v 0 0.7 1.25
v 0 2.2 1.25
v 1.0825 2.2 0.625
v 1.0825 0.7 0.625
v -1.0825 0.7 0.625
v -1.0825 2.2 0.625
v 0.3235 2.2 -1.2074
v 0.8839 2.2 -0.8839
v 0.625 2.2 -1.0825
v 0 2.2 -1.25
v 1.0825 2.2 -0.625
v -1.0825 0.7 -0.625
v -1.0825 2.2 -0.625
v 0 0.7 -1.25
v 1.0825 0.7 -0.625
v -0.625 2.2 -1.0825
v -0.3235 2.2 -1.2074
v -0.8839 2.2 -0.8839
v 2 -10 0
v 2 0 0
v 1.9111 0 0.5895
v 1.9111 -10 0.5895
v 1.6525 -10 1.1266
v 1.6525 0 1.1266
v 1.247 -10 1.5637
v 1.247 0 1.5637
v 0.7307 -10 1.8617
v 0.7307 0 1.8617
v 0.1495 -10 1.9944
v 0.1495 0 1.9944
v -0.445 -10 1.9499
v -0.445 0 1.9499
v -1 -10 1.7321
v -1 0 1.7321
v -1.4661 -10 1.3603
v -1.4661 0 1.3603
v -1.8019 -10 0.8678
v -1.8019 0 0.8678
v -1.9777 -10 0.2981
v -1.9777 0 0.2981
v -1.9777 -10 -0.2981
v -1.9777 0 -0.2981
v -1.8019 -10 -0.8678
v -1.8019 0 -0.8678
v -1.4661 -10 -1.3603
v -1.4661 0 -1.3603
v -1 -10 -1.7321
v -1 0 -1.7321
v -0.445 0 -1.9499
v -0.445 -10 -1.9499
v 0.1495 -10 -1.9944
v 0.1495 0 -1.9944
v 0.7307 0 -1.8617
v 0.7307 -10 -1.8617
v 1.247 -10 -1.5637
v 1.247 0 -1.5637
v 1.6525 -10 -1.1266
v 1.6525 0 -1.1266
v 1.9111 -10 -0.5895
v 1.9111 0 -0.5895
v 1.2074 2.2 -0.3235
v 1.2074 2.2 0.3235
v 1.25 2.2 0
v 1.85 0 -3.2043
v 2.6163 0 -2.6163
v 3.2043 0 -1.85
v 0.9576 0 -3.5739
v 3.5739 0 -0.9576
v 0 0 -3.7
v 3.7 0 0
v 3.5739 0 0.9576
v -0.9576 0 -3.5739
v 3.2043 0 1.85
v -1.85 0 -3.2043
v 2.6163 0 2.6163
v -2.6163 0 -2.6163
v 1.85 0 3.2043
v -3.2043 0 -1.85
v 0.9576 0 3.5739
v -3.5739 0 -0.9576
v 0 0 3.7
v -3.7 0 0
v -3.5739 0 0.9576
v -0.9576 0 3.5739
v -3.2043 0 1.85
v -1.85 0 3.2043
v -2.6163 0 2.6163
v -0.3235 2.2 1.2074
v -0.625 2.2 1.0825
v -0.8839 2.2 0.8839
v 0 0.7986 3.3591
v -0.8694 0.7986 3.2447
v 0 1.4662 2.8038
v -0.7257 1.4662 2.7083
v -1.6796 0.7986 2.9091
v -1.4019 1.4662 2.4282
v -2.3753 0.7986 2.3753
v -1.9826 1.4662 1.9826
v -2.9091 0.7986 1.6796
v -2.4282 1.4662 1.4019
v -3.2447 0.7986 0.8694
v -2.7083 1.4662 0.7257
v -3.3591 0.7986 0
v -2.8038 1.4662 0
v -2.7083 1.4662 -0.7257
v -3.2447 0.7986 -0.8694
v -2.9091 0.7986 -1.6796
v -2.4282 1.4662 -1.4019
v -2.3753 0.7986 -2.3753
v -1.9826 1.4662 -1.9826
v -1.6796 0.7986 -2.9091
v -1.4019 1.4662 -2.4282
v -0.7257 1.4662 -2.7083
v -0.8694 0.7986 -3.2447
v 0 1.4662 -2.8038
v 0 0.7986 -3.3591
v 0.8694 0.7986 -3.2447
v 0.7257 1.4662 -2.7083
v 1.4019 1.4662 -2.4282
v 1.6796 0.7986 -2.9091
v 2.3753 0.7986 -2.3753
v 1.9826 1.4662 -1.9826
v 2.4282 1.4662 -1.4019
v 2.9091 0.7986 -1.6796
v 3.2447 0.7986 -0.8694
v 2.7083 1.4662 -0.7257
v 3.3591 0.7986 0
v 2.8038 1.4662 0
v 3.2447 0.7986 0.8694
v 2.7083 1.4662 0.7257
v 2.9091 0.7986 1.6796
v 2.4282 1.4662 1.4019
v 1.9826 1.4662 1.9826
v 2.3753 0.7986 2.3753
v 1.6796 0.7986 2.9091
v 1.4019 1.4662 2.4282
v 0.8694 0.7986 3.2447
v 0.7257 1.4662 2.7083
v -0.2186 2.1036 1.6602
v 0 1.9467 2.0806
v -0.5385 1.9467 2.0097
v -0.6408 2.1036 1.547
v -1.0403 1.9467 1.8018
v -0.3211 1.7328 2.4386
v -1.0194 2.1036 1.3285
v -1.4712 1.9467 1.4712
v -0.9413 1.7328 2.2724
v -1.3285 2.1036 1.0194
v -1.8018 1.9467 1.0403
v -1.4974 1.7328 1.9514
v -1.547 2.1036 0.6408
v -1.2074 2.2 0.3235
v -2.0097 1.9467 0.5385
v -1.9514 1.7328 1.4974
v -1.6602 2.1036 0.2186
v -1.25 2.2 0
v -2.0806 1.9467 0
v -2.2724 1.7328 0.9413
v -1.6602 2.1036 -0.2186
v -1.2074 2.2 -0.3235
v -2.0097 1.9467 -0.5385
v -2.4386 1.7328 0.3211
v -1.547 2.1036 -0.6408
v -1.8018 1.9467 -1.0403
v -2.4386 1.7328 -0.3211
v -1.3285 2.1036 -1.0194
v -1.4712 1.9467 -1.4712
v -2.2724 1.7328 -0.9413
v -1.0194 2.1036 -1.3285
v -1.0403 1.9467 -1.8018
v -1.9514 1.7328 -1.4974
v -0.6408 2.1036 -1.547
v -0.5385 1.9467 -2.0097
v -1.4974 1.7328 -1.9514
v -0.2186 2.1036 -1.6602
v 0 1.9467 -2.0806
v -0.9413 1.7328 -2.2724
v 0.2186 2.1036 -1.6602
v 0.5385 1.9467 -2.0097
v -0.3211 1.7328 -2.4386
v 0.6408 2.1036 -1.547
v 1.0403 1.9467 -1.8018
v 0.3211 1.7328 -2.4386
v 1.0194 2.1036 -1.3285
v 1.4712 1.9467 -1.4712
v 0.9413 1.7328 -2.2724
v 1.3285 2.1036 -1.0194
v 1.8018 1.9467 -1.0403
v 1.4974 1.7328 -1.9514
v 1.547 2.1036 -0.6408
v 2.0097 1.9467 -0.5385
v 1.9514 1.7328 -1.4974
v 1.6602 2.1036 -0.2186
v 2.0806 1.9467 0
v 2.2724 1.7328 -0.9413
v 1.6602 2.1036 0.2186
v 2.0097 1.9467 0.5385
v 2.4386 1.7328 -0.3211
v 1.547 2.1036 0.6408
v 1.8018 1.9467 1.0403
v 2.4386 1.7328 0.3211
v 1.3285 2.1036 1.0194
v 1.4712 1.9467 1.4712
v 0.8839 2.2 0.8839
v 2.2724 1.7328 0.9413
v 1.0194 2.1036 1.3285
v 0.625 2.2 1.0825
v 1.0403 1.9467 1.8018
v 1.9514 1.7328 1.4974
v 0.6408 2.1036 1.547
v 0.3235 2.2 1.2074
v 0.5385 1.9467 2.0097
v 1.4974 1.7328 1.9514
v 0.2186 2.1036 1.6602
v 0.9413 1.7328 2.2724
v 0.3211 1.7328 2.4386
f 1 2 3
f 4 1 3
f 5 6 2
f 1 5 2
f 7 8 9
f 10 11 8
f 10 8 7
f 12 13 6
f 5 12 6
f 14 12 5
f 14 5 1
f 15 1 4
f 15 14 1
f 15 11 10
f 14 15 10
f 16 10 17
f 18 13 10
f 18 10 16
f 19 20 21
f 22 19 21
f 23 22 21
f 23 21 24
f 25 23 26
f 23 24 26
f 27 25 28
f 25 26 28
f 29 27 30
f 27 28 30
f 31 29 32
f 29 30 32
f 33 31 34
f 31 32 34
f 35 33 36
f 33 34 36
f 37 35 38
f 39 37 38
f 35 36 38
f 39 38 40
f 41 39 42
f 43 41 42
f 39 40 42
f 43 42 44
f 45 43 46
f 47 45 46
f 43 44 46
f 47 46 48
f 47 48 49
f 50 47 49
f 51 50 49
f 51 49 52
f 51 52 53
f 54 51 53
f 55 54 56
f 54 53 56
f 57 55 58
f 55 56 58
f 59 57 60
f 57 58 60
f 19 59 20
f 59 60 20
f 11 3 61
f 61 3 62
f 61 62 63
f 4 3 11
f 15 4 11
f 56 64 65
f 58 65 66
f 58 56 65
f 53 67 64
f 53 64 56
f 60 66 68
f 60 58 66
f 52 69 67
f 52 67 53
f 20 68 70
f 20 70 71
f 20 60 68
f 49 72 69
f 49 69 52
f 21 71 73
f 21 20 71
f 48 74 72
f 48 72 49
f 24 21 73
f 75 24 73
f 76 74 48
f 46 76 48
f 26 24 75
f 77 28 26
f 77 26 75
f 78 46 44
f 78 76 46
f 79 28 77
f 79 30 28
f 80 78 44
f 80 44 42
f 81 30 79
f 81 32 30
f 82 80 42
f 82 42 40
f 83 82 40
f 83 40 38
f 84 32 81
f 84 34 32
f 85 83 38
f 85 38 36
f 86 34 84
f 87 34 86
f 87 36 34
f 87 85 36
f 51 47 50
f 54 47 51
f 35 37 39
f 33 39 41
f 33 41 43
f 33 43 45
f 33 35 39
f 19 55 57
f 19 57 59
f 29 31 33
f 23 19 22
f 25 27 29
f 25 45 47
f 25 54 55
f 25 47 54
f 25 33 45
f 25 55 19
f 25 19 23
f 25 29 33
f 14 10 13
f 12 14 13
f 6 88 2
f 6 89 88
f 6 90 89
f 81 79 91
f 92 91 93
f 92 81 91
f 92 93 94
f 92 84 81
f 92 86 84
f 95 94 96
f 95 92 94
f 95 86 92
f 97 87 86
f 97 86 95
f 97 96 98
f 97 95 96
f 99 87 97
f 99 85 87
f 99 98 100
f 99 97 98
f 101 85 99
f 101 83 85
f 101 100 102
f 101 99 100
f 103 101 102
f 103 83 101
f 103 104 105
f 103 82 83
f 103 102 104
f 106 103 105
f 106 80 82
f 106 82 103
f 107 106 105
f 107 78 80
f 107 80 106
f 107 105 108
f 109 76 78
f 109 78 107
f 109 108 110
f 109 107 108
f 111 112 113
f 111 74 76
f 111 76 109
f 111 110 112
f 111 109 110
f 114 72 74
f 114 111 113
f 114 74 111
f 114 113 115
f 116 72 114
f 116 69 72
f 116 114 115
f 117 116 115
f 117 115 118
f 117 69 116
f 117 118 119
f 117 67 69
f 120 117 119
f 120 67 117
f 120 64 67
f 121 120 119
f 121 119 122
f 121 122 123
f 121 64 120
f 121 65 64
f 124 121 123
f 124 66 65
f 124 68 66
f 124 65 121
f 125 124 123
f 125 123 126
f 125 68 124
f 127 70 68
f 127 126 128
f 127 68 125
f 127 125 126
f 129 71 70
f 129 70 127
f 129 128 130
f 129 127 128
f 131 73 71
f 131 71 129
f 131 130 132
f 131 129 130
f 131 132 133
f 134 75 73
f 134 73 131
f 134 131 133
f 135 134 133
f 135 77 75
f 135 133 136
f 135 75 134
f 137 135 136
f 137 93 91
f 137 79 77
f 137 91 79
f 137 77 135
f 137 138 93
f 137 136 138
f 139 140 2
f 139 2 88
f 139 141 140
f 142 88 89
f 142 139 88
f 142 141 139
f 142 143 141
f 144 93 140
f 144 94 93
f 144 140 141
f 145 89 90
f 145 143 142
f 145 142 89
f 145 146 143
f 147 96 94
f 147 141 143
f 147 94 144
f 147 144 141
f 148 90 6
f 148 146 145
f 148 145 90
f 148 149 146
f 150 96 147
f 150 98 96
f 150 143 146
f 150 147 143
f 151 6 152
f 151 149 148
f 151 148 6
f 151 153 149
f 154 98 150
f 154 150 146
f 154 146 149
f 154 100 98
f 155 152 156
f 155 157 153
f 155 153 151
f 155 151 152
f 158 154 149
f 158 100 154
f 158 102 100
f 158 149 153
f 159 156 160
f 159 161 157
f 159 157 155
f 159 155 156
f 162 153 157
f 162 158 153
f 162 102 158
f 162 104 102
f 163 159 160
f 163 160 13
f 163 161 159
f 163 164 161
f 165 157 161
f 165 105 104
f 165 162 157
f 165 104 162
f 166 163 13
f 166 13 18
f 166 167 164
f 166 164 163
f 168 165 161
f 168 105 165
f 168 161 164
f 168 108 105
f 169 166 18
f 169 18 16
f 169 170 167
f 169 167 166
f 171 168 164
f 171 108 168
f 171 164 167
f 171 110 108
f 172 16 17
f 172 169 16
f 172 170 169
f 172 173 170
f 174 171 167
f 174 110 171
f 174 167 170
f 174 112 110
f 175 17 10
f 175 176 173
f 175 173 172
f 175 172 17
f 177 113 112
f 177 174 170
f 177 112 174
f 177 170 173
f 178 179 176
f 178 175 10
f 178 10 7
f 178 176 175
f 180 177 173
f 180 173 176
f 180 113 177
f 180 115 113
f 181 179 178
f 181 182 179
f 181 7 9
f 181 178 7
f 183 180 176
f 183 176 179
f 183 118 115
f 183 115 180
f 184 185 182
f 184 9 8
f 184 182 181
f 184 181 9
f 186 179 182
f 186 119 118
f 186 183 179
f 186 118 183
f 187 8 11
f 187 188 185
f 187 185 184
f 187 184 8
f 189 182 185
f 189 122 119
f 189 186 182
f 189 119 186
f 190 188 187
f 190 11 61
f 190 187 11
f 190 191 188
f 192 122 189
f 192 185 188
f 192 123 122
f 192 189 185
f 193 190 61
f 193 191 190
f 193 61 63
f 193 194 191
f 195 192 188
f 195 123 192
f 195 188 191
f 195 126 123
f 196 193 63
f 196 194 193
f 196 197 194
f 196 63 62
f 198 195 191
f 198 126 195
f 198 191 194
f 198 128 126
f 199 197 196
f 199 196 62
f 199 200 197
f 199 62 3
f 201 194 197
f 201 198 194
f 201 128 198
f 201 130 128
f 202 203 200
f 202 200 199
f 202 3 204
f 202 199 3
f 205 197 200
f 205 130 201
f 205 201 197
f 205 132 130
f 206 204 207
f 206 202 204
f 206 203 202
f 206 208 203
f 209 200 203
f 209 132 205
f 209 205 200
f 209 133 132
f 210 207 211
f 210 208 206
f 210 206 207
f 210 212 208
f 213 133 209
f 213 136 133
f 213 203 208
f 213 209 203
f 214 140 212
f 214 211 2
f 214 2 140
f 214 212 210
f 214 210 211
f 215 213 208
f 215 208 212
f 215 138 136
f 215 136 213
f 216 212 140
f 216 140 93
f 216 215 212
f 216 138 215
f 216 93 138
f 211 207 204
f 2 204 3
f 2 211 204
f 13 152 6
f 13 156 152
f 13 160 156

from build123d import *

# Parameters (mm, degrees)
SKETCH2_R           = 2
BOSS_EXTRUDE1_DEPTH = 10
CUT_EXTRUDE1_DEPTH  = 1.5


with BuildPart() as part:
    # Sketch1 → Revolve1 (revolve)
    with BuildSketch(Plane(origin=(0, 0, 0), x_dir=(0, 0, -1), z_dir=(1, 0, 0))):
        with BuildLine():
            Line((0, 0), (0, 2.2))
            Line((0, 2.2), (-1.25, 2.2))
            ThreePointArc((-1.25, 2.2), (-2.80380946, 1.466174172), (-3.7, 0))
            Line((-3.7, 0), (0, 0))
        make_face()
    revolve(axis=Axis((0, 4.725289413, 0), (0, -1, 0)))

    # Sketch2 → Boss-Extrude1 (add)
    with BuildSketch(Plane.XZ):
        Circle(SKETCH2_R)
    extrude(amount=BOSS_EXTRUDE1_DEPTH)

    # Sketch3 → Cut-Extrude1 (cut)
    with BuildSketch(Plane(origin=(0, 2.2, 0), x_dir=(1, 0, 0), z_dir=(0, 1, 0))):
        Polygon((0, 1.25), (-1.082531755, 0.625), (-1.082531755, -0.625), (0, -1.25), (1.082531755, -0.625), (1.082531755, 0.625), align=None)
    extrude(amount=-CUT_EXTRUDE1_DEPTH, mode=Mode.SUBTRACT)


solid = part.part
